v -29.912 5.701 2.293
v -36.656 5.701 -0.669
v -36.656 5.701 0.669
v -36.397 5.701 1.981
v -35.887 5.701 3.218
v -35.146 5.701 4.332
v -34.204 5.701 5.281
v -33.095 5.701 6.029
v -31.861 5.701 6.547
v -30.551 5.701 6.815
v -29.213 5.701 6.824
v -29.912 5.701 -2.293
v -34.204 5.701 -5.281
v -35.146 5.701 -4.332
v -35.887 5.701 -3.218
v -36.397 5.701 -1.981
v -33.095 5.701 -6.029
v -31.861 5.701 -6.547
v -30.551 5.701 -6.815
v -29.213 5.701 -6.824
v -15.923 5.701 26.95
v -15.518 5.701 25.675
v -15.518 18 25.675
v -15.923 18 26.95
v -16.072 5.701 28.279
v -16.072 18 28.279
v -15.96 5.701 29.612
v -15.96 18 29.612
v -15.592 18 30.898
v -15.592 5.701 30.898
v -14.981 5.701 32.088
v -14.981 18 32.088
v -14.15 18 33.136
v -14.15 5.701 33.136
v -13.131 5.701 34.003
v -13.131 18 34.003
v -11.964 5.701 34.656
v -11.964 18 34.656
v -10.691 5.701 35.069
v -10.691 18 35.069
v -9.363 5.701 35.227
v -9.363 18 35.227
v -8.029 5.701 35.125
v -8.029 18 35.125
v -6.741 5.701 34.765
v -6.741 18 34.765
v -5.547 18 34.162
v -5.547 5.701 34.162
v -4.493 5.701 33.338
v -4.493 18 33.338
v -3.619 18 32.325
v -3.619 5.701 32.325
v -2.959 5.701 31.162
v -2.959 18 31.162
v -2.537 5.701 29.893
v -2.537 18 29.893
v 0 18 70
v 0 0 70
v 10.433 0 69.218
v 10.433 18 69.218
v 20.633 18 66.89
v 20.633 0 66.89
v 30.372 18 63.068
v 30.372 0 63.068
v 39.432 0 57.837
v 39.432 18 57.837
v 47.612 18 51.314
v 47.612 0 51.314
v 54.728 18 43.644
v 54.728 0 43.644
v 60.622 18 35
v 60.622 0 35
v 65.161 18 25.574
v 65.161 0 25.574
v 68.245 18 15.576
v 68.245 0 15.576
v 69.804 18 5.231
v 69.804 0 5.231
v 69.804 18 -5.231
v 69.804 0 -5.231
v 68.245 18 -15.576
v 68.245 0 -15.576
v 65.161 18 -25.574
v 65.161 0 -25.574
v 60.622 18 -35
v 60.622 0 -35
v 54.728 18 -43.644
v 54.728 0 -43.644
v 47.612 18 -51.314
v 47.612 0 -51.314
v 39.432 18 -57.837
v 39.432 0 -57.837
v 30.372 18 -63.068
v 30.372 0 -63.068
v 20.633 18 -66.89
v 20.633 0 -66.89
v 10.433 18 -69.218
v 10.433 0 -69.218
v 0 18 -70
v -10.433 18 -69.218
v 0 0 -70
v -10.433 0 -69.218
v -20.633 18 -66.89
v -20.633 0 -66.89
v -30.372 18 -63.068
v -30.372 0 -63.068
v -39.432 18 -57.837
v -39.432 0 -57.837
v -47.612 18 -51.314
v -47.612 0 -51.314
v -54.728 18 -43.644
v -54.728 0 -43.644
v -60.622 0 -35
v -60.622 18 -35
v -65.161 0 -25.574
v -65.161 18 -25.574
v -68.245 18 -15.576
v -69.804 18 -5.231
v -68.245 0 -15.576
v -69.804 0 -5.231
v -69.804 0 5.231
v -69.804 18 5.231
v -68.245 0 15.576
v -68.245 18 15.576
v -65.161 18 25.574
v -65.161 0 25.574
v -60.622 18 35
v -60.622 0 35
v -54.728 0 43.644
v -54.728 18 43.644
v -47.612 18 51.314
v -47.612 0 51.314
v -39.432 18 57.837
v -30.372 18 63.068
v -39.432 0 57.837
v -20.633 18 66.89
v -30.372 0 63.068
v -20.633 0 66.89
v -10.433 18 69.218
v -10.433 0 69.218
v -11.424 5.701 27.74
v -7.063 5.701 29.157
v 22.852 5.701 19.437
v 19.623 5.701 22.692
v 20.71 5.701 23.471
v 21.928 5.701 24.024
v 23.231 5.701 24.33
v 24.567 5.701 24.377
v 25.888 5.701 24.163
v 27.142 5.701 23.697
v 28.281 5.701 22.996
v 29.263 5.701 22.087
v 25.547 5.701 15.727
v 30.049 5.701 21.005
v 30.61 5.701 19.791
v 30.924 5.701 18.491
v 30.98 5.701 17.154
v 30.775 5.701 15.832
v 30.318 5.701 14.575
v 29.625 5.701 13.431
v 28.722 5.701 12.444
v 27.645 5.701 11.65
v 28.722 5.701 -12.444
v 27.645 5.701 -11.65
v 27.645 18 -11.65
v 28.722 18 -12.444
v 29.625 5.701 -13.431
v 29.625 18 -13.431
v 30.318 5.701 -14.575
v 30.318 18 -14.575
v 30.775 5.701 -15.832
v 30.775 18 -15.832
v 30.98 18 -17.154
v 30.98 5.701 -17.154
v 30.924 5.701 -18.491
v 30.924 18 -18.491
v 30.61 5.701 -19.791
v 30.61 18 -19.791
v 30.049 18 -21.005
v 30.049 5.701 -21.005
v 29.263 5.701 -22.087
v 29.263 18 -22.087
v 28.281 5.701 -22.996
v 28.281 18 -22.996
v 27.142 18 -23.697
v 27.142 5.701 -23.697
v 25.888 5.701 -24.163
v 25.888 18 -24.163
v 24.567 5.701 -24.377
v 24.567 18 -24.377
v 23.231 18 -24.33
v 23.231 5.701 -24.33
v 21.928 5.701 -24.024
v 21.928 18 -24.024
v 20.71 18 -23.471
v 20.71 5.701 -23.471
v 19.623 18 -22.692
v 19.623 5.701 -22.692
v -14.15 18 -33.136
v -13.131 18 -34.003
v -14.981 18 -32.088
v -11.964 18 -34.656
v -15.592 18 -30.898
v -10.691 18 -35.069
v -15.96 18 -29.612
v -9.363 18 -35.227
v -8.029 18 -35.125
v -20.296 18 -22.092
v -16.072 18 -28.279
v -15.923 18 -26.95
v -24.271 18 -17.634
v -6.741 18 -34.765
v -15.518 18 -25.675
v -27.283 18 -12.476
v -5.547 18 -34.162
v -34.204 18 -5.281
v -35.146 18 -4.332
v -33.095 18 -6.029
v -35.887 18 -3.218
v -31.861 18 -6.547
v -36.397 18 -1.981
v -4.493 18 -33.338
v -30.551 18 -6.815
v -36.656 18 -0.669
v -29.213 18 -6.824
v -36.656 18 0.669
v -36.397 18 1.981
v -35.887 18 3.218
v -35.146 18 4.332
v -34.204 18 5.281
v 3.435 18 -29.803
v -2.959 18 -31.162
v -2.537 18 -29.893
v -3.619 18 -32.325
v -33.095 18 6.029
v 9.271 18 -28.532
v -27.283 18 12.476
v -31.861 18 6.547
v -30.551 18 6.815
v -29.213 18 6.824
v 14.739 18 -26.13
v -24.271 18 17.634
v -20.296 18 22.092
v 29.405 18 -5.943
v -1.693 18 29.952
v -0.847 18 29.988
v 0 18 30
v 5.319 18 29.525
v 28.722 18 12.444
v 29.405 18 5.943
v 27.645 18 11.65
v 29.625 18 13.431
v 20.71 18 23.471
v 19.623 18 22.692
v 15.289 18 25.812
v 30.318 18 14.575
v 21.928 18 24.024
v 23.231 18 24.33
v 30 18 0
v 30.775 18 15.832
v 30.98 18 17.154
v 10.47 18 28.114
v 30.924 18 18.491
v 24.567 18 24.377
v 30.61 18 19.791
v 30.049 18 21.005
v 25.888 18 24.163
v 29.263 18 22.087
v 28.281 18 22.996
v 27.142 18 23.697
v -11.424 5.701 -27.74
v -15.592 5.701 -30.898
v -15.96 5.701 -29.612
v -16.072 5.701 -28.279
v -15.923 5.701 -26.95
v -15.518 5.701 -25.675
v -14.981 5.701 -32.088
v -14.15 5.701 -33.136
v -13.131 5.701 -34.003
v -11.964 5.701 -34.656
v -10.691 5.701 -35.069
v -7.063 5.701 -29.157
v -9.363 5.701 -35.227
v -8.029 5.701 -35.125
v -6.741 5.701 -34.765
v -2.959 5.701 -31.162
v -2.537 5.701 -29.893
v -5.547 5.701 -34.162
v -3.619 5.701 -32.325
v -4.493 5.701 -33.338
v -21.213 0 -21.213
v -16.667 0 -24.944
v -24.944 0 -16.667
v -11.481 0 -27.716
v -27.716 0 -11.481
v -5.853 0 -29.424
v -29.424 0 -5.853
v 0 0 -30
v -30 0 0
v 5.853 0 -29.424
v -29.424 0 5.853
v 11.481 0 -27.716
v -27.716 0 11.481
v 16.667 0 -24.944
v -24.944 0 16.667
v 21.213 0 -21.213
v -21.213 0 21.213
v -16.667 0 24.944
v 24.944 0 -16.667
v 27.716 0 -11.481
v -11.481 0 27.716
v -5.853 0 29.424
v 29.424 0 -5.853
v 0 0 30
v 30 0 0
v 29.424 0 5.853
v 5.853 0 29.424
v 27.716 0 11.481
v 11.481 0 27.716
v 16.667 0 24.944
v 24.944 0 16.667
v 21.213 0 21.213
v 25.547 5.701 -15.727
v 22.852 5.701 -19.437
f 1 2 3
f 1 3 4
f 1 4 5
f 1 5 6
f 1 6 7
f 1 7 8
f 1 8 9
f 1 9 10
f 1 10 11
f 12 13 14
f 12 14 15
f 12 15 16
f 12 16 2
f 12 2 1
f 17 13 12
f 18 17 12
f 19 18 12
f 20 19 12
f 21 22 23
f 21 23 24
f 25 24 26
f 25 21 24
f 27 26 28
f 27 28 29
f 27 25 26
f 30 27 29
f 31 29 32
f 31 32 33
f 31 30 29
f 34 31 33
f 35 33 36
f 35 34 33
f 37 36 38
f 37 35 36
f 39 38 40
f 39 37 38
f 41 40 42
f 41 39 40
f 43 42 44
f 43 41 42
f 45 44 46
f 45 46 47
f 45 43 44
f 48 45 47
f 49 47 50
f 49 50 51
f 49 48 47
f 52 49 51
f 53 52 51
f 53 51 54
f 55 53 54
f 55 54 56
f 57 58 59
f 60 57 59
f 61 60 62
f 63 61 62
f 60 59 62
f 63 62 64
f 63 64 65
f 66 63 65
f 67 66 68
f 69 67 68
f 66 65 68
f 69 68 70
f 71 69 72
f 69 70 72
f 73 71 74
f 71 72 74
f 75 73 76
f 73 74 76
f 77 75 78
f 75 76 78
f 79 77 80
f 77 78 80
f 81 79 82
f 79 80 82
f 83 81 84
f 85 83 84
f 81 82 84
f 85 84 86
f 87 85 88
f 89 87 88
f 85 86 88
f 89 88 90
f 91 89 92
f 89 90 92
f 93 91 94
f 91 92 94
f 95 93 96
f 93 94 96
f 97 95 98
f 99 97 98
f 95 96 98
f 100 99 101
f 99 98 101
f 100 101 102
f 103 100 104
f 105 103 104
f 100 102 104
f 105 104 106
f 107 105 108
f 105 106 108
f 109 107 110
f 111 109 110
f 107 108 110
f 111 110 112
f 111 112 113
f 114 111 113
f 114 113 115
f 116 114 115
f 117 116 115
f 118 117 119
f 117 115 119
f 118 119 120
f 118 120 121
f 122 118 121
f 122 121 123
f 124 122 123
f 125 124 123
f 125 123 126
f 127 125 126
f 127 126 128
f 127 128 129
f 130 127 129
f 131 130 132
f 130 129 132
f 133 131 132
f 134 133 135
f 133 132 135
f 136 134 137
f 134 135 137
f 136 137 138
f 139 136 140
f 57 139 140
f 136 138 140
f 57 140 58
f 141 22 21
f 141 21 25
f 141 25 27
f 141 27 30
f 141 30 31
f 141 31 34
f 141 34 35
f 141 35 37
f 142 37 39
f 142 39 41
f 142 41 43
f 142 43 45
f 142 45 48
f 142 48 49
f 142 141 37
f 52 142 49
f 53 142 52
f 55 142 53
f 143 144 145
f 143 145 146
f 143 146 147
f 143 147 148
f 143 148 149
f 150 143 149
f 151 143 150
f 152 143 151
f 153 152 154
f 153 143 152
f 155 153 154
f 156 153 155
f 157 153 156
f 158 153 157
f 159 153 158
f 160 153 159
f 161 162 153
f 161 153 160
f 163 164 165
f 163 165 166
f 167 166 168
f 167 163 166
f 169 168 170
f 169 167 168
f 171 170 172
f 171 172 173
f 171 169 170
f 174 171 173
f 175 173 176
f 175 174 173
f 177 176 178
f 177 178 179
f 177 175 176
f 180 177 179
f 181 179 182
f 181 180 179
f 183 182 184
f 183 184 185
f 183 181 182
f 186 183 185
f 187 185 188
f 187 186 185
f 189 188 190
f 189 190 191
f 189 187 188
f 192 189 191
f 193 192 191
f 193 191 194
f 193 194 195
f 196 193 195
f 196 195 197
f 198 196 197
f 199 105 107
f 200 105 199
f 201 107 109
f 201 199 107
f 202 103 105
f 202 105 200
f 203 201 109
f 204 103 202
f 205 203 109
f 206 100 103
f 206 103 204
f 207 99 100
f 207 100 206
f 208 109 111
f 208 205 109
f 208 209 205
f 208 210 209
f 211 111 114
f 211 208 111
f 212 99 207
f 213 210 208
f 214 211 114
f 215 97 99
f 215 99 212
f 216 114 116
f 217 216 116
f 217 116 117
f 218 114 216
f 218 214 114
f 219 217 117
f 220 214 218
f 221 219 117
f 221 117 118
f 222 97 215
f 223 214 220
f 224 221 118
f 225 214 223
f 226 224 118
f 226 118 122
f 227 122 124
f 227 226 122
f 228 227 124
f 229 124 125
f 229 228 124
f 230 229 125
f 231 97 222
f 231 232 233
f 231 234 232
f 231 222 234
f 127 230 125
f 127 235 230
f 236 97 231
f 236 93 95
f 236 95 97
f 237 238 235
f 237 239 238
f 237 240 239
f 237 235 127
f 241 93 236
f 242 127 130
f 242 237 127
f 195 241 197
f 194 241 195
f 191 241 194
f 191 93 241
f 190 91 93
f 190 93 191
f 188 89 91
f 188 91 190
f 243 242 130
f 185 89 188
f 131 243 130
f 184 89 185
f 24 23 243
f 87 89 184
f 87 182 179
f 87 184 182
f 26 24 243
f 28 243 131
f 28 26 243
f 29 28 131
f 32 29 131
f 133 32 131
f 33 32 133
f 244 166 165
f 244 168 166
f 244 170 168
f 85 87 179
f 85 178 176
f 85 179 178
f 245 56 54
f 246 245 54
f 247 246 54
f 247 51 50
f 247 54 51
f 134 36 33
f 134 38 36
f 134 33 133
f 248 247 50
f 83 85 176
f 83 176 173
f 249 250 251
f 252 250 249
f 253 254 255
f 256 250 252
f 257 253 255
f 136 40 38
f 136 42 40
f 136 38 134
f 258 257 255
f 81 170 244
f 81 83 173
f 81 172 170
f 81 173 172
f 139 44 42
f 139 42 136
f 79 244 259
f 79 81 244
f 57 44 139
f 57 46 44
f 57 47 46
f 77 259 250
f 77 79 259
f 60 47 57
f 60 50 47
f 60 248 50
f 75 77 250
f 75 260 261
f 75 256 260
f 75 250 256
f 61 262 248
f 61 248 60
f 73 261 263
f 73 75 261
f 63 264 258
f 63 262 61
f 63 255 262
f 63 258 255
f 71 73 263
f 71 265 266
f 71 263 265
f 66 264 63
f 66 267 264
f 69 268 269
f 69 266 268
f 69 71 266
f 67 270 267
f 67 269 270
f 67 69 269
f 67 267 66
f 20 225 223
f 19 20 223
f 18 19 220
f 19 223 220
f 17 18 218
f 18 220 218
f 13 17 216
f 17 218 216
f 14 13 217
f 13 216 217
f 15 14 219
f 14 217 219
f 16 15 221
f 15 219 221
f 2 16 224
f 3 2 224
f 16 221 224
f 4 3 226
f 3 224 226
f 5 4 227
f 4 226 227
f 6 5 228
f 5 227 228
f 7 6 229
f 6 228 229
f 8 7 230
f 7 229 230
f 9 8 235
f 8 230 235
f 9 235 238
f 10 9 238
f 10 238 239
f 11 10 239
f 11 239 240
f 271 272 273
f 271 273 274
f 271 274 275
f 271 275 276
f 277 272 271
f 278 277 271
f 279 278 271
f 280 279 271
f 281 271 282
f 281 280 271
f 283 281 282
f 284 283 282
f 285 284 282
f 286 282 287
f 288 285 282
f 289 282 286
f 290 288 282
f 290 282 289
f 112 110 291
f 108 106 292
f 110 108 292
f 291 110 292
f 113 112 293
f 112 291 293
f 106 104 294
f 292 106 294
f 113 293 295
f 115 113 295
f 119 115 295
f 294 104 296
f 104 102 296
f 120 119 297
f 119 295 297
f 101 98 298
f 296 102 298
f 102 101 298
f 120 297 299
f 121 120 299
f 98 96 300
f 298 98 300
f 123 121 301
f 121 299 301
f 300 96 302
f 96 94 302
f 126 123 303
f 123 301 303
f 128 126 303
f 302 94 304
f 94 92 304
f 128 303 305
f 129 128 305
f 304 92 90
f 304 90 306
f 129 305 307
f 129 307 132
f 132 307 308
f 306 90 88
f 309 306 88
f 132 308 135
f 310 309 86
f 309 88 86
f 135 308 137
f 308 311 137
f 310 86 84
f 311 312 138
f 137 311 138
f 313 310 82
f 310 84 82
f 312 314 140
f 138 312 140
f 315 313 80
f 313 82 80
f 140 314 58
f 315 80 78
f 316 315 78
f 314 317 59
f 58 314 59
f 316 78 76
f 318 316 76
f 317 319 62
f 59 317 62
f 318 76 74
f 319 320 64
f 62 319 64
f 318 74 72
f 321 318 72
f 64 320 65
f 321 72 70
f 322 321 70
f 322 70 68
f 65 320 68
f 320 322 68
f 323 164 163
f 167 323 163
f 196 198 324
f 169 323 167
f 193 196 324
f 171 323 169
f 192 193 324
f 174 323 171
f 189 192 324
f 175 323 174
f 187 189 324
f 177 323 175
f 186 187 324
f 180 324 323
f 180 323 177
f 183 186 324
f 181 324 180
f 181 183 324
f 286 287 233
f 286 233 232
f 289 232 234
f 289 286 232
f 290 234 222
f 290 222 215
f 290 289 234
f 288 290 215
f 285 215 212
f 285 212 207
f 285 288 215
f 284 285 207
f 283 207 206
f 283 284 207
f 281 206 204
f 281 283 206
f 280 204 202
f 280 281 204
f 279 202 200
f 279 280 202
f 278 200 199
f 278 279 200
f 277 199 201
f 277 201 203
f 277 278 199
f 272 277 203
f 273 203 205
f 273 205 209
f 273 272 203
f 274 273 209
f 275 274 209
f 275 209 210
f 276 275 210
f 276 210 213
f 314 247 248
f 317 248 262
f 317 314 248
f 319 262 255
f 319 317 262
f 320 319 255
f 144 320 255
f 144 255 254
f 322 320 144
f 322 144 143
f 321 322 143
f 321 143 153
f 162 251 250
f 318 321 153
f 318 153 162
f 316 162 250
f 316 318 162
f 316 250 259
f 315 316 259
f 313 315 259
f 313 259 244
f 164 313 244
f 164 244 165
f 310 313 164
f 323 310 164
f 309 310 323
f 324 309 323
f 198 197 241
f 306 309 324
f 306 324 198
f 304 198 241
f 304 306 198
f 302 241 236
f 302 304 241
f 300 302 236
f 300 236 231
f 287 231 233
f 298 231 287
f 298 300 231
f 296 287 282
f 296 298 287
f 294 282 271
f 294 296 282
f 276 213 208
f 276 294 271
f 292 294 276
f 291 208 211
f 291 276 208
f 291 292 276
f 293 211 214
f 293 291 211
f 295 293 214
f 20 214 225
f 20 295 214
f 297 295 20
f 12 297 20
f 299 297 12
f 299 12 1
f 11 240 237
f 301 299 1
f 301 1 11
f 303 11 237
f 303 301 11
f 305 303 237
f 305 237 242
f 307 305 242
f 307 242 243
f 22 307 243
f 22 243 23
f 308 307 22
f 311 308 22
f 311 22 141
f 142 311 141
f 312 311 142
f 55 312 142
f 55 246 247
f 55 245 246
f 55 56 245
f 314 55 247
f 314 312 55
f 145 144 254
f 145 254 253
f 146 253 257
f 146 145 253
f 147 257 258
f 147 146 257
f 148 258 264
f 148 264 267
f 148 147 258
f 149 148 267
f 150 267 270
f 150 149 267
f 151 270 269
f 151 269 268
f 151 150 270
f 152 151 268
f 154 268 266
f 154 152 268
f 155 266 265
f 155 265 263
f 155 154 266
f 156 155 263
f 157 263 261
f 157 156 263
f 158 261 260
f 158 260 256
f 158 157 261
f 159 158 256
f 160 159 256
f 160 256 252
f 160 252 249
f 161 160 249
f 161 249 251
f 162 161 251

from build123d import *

# Parameters (mm, degrees)
SKETCH1_R           = 70
BOSS_EXTRUDE1_DEPTH = 18
SKETCH2_R           = 30
CUT_EXTRUDE1_DEPTH  = 101.618089825
SKETCH3_R           = 6.852756537
CUT_EXTRUDE2_DEPTH  = 12.299091949
CIRPATTERN1_COUNT   = 5


with BuildPart() as part:
    # Sketch1 → Boss-Extrude1 (new body)
    with BuildSketch(Plane(origin=(0, 0, 0), x_dir=(1, 0, 0), z_dir=(0, 1, 0))):
        Circle(SKETCH1_R)
    extrude(amount=BOSS_EXTRUDE1_DEPTH)

    # Sketch2 → Cut-Extrude1 (cut, through all)
    with BuildSketch(Plane(origin=(0, 0, 0), x_dir=(1, 0, 0), z_dir=(0, 1, 0))):
        Circle(SKETCH2_R)
    extrude(amount=CUT_EXTRUDE1_DEPTH, mode=Mode.SUBTRACT)

    # Sketch3 → Cut-Extrude2 (cut)
    with BuildSketch(Plane(origin=(0, 18, 0), x_dir=(1, 0, 0), z_dir=(0, 1, 0))):
        with Locations((-29.836323448, 0)):
            Circle(SKETCH3_R)
    cut_extrude2 = extrude(amount=-CUT_EXTRUDE2_DEPTH, mode=Mode.SUBTRACT)

    # CirPattern1: Cut-Extrude2 ×5 about axis
    cirpattern1_axis = Axis((0, 0, 0), (0, 1, 0))
    for i in range(1, CIRPATTERN1_COUNT):
        add(cut_extrude2.rotate(cirpattern1_axis, i * 360 / CIRPATTERN1_COUNT), mode=Mode.SUBTRACT)


solid = part.part
